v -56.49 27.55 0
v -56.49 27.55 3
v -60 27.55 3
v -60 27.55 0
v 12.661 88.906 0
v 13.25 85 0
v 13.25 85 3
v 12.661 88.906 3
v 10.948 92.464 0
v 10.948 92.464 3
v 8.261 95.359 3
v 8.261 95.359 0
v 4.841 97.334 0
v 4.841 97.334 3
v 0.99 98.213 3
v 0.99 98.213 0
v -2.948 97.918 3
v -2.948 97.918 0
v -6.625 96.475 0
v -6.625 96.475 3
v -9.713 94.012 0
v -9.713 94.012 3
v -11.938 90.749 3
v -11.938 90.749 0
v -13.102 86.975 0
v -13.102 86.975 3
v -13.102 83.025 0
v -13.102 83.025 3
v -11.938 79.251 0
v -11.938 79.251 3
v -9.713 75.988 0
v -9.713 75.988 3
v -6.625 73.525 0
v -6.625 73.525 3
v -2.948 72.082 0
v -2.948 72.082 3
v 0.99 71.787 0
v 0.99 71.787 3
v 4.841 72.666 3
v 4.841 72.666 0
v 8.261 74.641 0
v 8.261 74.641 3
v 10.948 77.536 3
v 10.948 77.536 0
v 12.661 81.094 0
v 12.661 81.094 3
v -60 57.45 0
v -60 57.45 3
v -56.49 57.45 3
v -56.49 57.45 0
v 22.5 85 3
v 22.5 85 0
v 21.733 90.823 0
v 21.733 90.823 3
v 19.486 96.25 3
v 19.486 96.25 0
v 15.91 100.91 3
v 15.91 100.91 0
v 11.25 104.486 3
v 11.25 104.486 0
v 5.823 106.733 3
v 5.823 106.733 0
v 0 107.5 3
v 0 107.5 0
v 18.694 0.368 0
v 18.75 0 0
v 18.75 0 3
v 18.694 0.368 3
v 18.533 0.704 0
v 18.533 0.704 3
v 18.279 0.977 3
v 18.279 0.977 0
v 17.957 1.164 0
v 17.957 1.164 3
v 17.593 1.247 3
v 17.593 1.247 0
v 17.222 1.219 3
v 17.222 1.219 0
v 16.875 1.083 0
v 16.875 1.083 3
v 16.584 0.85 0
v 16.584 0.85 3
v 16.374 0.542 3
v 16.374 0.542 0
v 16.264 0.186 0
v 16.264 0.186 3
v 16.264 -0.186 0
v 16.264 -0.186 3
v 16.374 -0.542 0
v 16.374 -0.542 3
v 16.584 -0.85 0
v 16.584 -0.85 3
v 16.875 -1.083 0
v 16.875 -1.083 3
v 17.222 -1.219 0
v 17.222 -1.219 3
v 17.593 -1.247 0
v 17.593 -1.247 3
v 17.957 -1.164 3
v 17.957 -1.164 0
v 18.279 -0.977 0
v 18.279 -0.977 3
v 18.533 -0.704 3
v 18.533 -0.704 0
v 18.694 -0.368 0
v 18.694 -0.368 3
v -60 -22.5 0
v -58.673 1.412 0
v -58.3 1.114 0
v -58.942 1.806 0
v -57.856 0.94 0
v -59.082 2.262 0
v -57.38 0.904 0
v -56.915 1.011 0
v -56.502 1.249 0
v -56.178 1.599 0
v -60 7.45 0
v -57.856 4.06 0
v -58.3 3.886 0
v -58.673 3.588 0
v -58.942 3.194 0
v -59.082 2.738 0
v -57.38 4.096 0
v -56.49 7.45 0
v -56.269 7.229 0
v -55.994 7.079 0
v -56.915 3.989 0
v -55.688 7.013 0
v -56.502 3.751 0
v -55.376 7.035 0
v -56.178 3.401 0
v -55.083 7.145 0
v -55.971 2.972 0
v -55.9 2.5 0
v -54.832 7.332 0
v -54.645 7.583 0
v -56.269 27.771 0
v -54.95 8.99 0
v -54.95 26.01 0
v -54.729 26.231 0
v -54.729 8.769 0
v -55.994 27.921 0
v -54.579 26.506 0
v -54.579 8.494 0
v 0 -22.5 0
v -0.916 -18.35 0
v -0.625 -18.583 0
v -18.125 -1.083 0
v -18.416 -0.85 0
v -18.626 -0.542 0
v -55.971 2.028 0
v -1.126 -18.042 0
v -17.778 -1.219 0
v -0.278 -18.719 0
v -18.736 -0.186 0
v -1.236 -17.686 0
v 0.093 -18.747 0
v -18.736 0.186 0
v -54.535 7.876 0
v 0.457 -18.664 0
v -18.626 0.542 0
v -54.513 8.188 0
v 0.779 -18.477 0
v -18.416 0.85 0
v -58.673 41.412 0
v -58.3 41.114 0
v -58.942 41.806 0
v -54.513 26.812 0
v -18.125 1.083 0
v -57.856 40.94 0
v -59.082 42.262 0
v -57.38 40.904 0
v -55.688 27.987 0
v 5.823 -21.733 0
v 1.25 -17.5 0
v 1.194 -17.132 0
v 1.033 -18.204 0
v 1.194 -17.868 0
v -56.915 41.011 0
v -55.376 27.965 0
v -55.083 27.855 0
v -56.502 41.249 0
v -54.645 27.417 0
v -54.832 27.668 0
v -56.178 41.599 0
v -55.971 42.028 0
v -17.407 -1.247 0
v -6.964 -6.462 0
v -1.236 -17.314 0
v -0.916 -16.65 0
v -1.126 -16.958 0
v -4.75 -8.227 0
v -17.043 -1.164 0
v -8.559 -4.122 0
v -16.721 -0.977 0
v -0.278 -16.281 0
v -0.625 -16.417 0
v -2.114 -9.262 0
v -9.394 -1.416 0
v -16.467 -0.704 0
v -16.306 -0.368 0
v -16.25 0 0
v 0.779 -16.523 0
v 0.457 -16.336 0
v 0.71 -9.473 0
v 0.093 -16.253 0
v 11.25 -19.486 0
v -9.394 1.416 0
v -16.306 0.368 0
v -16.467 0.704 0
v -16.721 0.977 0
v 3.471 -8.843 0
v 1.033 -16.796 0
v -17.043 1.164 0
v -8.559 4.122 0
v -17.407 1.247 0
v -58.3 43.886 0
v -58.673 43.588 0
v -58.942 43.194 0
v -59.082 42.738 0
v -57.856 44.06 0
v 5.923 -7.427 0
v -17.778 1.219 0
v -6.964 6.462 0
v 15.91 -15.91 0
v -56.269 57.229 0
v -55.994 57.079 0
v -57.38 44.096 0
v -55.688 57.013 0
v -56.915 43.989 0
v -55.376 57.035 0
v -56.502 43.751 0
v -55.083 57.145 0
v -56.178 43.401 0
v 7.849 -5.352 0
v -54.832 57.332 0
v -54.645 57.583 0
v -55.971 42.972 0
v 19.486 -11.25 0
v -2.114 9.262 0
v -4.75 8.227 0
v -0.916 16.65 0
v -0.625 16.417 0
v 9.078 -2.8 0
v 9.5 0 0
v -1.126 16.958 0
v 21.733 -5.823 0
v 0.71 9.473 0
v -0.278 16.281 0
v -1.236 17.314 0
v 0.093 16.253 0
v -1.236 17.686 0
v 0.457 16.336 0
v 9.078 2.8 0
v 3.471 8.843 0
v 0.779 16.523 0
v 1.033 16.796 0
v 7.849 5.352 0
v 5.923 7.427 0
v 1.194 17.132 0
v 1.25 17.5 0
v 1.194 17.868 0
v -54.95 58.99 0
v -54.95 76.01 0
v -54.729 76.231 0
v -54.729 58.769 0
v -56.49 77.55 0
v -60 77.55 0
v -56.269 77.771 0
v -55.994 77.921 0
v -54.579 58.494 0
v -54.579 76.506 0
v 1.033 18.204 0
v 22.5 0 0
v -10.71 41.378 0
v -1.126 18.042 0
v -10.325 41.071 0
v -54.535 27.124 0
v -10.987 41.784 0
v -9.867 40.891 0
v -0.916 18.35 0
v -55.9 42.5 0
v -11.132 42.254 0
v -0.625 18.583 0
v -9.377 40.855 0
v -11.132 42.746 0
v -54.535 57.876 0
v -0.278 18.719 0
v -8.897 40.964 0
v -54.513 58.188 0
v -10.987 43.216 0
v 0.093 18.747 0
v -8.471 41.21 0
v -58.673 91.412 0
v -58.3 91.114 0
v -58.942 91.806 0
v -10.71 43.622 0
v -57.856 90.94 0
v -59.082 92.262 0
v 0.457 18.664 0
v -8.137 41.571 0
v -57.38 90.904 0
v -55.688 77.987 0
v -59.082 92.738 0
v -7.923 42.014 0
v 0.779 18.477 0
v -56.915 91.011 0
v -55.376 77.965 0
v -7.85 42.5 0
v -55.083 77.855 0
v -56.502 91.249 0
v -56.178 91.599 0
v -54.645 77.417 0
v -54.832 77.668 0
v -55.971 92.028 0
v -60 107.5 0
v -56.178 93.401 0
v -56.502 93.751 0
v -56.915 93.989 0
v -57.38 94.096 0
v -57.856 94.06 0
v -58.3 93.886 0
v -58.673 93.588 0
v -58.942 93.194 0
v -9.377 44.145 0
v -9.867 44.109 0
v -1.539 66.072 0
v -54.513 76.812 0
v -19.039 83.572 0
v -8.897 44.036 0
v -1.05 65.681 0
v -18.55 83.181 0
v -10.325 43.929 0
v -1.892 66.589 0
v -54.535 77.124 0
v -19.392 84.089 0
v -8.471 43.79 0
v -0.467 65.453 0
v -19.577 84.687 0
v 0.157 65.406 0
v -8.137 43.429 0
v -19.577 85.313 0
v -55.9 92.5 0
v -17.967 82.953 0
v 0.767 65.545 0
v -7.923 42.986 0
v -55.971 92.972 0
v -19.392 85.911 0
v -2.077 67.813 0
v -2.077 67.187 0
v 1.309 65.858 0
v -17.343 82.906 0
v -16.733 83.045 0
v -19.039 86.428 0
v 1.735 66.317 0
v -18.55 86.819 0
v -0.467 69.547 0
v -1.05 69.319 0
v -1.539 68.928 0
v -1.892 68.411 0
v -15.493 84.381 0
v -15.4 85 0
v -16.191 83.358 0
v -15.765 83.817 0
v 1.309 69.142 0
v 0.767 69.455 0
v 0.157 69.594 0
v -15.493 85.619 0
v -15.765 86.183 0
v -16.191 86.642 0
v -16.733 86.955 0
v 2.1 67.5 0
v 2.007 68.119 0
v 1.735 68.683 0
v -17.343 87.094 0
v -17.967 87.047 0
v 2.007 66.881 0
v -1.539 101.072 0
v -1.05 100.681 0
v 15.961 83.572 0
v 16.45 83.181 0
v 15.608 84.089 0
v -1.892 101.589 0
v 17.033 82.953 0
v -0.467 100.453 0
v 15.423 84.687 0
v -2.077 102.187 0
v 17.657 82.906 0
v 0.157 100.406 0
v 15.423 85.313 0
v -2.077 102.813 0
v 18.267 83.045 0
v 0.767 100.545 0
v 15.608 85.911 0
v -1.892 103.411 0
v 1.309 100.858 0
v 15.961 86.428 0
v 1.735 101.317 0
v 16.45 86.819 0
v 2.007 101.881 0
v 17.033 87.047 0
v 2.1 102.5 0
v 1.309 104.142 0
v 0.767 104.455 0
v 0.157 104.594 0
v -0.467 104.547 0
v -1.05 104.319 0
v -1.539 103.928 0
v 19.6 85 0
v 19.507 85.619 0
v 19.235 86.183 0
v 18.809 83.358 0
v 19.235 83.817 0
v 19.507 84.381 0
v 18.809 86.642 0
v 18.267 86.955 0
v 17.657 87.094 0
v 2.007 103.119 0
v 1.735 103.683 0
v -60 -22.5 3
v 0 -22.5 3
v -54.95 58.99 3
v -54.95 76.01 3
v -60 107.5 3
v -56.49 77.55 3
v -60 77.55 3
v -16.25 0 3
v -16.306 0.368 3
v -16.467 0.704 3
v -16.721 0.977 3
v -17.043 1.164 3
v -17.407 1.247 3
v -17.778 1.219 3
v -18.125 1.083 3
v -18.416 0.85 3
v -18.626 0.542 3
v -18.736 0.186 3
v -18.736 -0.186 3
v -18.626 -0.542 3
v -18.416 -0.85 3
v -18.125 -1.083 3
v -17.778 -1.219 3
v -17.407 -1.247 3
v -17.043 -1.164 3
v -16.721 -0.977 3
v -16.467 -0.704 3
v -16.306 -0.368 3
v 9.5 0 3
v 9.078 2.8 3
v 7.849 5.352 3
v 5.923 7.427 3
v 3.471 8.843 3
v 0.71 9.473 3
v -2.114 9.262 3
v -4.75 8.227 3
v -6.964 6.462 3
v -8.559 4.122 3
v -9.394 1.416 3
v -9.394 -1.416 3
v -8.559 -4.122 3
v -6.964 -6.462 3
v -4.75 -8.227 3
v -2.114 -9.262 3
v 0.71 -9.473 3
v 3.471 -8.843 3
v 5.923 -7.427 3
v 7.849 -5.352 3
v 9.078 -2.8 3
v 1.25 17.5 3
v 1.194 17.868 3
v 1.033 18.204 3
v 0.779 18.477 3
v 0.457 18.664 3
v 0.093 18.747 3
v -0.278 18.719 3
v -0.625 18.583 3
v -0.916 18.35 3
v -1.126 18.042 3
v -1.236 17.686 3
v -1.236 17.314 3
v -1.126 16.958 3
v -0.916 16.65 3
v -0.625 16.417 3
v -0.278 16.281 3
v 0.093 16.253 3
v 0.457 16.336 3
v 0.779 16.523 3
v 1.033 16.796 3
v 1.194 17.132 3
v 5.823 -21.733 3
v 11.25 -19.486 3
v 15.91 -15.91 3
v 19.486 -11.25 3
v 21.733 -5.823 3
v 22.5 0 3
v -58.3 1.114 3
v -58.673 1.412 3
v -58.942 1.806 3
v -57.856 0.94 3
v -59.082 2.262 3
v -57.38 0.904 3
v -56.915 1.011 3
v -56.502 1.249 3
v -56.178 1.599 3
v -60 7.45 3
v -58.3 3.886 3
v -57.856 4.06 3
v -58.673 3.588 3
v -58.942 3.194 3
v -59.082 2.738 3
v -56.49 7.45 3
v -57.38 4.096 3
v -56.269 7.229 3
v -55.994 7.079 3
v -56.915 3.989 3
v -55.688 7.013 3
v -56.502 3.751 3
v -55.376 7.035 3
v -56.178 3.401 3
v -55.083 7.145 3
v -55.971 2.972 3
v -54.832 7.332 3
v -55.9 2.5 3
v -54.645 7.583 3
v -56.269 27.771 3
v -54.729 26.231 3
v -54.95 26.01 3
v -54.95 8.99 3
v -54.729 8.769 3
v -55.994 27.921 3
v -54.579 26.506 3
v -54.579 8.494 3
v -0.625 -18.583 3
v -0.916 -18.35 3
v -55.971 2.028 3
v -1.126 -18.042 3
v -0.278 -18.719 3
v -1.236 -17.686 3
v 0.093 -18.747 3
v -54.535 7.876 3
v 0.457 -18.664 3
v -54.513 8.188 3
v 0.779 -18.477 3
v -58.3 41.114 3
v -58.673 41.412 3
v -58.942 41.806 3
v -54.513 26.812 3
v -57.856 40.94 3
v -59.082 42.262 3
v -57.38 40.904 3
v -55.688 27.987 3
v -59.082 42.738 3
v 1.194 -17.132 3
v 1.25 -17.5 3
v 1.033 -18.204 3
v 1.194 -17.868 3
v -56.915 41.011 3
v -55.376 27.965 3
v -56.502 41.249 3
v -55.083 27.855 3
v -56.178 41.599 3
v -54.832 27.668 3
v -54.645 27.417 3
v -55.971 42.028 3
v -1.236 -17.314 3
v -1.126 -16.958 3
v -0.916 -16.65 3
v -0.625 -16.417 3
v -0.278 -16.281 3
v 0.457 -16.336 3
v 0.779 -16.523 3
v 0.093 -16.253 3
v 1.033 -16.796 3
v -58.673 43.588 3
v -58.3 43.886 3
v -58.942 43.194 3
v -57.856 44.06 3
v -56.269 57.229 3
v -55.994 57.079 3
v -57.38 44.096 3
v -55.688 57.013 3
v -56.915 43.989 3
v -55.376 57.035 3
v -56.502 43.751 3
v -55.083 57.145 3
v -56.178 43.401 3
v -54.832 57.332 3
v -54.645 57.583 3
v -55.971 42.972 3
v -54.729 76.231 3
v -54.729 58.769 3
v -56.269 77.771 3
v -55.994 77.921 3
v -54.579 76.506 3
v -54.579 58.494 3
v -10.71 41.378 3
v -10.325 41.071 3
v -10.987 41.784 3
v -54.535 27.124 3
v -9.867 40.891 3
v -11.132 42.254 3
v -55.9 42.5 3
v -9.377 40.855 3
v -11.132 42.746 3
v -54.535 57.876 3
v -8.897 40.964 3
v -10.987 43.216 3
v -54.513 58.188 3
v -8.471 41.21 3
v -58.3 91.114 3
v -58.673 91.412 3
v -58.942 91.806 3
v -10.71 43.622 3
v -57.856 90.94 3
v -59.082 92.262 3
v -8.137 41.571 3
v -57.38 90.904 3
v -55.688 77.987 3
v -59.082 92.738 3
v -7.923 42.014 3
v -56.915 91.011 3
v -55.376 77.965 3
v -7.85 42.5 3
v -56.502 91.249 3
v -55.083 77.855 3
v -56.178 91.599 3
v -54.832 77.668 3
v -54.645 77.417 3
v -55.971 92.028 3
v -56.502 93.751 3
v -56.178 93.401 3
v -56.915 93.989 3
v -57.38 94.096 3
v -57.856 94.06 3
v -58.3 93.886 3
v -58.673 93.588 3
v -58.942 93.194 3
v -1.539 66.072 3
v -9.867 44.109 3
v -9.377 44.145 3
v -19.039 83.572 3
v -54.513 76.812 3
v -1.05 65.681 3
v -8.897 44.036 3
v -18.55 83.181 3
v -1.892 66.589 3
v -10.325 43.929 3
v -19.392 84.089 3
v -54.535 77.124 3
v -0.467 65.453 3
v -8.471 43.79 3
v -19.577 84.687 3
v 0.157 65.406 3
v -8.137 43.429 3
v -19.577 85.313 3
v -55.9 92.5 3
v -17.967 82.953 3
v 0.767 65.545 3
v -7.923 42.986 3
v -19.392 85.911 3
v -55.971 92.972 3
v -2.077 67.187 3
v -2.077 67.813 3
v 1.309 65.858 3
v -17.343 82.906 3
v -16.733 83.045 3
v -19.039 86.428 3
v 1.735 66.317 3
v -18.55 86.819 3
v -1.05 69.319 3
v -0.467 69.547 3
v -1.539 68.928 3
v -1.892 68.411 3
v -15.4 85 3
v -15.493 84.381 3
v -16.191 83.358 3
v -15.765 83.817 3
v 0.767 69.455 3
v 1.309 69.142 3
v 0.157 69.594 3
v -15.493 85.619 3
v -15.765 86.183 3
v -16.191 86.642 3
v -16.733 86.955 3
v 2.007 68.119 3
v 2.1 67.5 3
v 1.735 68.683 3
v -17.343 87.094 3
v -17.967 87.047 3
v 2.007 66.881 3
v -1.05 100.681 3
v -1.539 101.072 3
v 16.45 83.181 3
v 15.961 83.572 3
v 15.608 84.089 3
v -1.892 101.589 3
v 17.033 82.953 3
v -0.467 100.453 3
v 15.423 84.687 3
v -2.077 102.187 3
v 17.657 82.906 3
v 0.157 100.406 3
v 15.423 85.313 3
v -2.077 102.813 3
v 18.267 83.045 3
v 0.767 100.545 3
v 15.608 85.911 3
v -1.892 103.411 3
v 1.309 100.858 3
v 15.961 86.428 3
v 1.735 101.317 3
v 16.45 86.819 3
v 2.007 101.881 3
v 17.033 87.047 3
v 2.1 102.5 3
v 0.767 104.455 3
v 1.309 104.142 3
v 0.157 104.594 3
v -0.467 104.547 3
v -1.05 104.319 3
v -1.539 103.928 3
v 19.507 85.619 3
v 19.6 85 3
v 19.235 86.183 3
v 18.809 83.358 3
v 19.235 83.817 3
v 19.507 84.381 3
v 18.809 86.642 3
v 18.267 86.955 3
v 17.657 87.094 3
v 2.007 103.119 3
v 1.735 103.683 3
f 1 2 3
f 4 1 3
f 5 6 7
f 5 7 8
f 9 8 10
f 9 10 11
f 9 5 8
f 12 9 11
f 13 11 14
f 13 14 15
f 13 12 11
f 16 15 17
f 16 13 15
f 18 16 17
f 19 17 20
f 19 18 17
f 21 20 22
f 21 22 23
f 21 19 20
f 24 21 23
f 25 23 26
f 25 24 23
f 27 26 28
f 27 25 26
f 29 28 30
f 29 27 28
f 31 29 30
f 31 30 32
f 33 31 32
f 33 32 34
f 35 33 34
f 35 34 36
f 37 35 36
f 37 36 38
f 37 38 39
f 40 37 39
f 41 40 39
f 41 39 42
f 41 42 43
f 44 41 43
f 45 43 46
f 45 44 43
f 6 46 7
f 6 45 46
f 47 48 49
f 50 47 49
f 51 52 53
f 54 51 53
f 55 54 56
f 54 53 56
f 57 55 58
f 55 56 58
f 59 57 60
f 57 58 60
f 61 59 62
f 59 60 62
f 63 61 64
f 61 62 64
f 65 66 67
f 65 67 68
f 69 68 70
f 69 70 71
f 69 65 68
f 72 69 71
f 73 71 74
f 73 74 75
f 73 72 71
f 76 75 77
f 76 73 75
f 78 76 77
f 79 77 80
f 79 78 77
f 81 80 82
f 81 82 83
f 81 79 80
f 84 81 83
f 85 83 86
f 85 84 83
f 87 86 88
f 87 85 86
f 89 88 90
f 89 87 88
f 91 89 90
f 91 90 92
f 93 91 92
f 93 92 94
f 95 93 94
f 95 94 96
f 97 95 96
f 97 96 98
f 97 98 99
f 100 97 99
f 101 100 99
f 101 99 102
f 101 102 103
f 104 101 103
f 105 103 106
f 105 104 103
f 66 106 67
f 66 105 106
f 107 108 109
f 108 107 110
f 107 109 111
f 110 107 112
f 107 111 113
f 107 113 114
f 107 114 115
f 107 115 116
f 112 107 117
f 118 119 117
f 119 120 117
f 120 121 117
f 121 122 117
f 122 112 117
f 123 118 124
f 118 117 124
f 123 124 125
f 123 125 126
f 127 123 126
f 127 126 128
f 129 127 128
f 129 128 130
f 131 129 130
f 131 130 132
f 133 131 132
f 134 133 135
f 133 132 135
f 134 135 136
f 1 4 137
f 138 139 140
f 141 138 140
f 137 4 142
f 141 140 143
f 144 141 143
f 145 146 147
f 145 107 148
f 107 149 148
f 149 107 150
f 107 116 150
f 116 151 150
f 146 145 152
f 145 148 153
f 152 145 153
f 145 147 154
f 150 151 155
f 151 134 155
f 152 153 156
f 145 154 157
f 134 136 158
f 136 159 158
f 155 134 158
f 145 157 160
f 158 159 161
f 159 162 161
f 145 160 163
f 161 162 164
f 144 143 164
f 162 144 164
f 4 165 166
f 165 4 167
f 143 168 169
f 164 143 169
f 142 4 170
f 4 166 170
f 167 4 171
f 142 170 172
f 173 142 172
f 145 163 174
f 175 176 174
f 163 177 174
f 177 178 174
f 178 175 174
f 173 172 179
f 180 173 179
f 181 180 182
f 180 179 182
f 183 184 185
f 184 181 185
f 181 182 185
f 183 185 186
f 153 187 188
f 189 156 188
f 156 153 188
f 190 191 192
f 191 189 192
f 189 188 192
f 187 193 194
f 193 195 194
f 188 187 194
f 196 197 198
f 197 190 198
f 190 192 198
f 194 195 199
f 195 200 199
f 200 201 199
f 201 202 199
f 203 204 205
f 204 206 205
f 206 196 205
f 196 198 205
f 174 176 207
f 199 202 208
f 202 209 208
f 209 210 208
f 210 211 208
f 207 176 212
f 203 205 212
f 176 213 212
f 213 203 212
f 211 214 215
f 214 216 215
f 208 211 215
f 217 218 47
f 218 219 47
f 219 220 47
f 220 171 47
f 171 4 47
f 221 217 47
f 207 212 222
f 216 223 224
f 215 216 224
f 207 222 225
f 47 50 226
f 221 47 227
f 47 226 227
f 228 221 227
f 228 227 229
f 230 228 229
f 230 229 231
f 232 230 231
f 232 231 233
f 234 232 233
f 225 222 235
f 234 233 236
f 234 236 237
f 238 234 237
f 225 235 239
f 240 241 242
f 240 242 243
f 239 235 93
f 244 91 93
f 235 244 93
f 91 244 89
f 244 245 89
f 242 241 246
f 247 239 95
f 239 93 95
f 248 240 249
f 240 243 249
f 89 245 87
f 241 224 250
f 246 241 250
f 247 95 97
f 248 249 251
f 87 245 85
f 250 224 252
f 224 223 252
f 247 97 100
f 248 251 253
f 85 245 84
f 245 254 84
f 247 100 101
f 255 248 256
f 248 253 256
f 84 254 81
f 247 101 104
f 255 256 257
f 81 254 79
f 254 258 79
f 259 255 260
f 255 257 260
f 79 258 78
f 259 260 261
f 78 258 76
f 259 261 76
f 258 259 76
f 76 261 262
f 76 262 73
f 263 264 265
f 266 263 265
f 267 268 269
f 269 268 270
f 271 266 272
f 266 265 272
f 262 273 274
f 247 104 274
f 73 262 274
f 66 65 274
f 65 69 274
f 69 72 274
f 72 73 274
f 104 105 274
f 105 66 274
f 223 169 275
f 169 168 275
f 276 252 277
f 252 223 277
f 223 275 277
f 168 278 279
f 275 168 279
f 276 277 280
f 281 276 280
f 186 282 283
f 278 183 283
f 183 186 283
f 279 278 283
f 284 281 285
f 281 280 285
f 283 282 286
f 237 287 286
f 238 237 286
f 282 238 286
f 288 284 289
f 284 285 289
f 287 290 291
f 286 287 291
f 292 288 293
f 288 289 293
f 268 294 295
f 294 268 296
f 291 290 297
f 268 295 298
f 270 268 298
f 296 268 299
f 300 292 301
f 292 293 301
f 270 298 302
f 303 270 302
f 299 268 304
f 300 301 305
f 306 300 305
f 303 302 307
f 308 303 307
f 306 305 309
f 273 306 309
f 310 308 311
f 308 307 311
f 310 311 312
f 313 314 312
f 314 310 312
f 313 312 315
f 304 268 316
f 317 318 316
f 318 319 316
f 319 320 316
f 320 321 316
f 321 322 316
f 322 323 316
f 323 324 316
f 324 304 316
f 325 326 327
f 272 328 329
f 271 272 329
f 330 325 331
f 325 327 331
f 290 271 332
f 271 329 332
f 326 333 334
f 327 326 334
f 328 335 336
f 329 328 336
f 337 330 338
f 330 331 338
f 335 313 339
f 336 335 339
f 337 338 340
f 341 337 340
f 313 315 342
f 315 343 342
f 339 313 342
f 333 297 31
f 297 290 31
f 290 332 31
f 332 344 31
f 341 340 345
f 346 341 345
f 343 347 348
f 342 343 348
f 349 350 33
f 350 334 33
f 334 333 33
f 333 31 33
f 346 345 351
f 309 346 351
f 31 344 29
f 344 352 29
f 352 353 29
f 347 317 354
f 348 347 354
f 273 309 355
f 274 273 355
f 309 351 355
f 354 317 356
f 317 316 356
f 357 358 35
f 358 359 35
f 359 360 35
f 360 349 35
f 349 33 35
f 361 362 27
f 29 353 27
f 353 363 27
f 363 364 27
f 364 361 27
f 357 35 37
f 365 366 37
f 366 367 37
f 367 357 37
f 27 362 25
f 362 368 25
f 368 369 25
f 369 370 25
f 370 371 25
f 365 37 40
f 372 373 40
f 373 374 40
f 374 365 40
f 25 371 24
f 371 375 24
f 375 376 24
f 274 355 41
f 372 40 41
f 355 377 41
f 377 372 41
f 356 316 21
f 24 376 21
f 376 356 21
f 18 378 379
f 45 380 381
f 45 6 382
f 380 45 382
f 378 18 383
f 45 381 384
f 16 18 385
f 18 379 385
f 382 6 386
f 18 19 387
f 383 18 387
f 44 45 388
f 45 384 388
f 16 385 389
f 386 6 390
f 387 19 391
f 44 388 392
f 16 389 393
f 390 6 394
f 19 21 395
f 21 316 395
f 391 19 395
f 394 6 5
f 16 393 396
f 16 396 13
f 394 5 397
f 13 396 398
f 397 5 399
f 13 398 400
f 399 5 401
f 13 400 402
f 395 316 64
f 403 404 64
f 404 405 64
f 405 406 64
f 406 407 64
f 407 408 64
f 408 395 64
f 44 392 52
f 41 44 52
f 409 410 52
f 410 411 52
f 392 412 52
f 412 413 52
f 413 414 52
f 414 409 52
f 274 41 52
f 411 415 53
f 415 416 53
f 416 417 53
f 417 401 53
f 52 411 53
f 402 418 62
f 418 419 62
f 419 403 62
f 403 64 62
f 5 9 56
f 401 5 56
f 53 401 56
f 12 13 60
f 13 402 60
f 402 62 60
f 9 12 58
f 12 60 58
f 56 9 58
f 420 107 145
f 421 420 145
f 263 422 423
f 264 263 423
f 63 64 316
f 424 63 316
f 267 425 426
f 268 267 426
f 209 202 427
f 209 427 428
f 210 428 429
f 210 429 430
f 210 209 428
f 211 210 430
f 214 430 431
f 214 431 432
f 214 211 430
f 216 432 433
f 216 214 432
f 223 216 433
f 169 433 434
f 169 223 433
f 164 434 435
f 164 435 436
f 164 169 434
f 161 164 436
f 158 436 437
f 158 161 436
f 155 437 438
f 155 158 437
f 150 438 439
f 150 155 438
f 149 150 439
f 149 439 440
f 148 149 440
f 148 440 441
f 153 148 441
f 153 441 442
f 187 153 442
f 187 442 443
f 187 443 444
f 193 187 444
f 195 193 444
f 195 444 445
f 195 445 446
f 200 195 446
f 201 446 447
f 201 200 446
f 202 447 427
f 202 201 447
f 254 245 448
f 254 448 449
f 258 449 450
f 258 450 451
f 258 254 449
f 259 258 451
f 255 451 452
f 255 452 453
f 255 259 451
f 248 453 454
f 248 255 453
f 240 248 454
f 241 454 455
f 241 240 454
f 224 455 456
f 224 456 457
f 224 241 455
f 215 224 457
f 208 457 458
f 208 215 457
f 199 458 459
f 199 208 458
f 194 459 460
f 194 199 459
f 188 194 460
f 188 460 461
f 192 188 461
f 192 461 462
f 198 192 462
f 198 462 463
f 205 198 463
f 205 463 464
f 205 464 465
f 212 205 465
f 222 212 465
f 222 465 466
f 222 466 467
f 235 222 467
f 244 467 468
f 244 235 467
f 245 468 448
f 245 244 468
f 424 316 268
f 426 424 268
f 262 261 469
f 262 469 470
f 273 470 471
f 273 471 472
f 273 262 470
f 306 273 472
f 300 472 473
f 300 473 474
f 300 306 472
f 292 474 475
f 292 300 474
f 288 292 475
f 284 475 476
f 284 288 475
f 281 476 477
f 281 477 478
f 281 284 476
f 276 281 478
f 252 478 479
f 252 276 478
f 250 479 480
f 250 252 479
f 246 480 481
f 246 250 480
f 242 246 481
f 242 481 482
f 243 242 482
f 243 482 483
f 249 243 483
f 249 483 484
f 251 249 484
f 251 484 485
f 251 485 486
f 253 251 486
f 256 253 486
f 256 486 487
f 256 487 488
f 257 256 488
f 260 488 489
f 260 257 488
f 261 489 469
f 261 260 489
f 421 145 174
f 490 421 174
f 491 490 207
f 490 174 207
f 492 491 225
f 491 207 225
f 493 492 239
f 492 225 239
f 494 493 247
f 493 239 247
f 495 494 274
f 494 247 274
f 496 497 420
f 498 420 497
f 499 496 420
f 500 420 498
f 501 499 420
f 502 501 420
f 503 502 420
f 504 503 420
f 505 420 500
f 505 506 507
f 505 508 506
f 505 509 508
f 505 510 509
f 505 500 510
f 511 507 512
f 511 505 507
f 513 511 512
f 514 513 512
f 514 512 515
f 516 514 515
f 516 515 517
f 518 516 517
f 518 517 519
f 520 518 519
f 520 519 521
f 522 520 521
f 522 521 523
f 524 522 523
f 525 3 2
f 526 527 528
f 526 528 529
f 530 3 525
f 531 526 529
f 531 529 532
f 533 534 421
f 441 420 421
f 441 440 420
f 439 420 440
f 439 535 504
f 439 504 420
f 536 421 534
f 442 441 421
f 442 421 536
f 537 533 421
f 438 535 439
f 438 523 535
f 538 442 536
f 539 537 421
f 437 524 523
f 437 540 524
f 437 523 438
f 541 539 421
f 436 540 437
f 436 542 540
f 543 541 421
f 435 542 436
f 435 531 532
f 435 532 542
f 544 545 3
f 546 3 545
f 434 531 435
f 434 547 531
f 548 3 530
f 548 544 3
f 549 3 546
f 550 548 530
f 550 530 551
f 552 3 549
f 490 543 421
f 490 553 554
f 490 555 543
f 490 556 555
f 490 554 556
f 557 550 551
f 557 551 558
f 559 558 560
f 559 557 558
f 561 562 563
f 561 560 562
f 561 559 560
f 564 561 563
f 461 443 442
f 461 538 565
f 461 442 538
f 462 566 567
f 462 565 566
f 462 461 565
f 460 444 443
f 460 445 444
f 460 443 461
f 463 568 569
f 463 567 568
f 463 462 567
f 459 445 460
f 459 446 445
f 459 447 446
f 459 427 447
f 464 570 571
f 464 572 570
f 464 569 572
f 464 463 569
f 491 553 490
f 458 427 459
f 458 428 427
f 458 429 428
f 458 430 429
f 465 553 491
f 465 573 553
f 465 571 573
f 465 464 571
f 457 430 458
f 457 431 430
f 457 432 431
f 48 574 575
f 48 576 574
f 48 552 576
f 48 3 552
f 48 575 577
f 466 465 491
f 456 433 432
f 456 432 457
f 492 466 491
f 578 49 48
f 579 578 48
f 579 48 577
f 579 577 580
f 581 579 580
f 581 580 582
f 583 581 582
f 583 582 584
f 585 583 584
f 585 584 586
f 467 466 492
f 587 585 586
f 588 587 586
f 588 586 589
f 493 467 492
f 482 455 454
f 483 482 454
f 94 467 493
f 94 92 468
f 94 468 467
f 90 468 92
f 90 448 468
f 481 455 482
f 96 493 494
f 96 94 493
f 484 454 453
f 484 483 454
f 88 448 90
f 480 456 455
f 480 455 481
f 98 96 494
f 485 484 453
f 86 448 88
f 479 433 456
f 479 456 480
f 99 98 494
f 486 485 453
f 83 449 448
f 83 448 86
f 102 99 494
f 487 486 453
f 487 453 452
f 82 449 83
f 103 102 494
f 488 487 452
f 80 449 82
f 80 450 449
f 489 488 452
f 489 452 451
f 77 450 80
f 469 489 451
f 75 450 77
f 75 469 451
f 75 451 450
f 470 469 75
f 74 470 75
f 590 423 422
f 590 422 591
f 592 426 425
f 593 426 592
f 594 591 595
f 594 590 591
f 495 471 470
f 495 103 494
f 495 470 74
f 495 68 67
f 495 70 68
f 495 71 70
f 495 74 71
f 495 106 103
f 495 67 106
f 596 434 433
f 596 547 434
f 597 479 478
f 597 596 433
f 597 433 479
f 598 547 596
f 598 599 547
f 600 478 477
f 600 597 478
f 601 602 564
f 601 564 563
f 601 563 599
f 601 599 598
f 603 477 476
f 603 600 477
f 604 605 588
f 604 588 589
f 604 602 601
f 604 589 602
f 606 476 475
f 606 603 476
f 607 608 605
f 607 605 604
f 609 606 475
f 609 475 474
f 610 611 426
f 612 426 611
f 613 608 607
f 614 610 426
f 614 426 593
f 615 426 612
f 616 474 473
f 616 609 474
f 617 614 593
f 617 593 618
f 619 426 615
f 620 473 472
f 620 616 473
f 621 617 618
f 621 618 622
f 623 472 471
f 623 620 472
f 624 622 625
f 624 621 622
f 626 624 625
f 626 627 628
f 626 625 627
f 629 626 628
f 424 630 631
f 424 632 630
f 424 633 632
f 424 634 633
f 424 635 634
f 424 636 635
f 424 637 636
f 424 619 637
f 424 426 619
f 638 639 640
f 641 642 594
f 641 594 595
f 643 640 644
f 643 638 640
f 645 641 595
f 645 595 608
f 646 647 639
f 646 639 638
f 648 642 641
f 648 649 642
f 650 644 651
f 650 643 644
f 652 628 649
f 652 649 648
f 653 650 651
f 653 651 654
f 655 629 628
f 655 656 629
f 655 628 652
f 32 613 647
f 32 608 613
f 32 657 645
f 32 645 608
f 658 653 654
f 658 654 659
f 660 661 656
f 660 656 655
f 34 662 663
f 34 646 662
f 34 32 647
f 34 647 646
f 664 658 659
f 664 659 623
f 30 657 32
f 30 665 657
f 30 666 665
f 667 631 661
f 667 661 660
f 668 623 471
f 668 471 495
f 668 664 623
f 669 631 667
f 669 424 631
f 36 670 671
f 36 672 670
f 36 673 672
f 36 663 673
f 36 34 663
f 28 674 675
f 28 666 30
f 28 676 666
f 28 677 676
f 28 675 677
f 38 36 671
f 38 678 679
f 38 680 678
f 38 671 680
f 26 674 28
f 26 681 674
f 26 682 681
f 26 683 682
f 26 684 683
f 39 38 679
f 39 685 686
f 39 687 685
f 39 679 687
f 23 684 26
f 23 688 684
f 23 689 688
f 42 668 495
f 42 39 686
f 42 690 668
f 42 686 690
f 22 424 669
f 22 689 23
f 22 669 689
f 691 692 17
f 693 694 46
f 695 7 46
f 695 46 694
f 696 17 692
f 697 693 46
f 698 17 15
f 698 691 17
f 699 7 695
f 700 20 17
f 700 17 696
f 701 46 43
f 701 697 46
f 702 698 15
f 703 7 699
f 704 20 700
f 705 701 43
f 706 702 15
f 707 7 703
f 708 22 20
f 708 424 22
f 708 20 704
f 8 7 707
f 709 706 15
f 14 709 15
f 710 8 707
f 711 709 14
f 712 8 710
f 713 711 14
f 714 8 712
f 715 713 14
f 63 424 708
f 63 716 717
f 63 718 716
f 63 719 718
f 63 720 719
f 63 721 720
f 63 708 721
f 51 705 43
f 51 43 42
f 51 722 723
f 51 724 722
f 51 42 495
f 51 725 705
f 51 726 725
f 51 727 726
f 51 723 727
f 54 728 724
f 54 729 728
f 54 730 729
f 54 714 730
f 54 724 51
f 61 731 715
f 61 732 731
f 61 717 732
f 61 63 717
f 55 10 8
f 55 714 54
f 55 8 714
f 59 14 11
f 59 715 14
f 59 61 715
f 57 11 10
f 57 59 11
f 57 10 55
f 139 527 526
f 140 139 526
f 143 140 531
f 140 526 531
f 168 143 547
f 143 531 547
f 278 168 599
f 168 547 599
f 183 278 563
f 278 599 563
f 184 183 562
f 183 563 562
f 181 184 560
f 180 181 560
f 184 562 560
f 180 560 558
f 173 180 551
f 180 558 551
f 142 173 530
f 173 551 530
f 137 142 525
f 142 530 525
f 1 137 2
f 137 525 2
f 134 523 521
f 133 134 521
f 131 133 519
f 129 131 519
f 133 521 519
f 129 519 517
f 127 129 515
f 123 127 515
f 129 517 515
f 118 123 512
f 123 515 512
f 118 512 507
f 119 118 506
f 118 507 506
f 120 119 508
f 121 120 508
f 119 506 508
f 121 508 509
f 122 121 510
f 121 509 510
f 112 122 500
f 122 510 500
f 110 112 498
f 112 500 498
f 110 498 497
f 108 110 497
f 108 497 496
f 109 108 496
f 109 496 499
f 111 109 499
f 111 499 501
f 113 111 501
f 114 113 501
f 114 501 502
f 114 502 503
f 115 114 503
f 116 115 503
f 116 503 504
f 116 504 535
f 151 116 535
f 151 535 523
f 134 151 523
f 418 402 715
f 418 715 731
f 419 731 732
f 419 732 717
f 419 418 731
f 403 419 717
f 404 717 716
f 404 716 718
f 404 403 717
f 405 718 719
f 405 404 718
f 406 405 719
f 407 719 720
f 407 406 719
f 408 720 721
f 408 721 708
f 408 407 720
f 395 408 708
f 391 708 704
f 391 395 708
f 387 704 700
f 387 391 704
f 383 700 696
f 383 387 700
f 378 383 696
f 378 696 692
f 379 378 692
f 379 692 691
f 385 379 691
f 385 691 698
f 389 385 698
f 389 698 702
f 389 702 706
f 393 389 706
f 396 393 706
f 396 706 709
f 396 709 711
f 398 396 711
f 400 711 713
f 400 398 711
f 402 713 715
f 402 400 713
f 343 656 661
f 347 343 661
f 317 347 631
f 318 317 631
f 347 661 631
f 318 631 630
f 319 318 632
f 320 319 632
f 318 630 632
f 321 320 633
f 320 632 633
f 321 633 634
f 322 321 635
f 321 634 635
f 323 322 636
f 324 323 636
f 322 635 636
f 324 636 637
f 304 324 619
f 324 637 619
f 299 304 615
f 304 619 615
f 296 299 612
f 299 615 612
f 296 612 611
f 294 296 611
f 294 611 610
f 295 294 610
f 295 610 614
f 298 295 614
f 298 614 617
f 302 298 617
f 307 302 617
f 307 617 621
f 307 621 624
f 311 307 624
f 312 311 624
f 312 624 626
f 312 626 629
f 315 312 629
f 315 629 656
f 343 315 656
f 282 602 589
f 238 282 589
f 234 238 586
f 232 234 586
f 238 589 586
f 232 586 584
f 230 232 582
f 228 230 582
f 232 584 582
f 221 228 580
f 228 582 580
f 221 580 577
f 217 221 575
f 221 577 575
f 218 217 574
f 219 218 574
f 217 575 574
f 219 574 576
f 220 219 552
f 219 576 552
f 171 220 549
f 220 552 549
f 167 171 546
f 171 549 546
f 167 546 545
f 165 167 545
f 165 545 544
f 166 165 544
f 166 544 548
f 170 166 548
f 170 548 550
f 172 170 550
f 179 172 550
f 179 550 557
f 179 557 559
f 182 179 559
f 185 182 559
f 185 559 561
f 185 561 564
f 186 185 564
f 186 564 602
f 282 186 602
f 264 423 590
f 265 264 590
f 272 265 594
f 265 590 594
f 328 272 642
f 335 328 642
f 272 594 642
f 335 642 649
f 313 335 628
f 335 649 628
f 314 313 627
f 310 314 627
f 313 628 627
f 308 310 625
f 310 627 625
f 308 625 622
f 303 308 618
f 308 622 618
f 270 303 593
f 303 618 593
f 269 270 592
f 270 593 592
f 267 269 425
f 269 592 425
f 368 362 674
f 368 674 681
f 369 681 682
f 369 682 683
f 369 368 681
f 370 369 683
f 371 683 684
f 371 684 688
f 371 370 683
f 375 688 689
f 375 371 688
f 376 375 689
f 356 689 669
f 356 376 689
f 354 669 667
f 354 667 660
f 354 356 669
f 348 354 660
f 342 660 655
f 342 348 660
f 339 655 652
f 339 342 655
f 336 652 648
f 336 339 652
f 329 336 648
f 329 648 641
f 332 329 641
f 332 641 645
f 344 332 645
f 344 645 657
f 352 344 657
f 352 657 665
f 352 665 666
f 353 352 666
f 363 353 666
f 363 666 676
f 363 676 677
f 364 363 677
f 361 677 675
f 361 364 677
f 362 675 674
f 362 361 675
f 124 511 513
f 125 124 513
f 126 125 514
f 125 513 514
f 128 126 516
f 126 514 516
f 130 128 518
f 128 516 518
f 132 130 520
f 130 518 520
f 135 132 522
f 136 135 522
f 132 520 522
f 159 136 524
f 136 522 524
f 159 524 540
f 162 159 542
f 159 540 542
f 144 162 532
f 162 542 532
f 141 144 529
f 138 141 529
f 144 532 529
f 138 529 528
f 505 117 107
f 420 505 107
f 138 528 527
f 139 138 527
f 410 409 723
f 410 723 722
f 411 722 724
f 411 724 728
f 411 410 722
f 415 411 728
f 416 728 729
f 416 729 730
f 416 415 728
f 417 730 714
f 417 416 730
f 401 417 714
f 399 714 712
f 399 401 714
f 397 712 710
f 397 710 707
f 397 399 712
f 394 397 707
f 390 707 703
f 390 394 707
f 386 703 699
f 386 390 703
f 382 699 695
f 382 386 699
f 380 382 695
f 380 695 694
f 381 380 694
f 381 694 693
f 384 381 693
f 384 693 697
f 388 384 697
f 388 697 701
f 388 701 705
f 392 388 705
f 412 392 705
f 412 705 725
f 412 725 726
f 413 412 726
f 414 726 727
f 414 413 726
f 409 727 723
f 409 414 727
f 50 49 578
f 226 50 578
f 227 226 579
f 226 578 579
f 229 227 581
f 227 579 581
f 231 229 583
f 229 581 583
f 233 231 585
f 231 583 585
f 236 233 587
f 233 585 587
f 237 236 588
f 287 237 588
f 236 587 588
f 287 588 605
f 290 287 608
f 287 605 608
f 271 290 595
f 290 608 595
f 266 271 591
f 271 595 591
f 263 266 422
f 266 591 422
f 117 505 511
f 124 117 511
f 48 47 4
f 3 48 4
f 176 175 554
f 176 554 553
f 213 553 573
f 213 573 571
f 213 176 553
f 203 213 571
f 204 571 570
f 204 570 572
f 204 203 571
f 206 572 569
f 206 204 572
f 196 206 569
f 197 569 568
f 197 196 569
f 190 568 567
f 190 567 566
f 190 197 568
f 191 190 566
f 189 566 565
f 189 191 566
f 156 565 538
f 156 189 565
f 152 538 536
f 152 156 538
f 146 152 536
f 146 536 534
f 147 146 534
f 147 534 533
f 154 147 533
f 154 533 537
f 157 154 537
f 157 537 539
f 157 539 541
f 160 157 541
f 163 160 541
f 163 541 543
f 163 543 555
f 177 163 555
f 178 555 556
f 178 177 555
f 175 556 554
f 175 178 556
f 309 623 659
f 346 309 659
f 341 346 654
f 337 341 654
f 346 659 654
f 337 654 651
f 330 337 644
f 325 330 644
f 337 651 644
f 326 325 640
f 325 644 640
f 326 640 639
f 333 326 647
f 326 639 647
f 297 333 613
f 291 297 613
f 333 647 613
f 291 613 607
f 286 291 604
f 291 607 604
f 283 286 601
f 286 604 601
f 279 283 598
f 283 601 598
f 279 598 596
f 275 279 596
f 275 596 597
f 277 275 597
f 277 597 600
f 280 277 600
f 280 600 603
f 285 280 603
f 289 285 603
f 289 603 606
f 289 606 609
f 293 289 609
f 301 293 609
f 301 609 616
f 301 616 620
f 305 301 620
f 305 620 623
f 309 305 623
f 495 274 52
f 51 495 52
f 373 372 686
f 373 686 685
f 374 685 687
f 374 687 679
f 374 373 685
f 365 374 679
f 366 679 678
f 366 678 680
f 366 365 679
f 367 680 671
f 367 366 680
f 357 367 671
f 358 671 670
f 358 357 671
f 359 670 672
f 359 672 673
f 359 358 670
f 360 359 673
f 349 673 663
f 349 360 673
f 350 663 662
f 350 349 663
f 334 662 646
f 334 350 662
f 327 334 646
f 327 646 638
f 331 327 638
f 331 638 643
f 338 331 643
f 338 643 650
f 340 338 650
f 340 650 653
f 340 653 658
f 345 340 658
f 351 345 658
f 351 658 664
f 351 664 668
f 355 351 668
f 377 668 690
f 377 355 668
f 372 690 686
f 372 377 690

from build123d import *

# Parameters (mm, degrees)
SKETCH_2_R          = 9.5
SKETCH_2_R_2        = 1.25
SKETCH_2_R_3        = 13.25
SKETCH_2_R_4        = 2.1
EXTRUDE_1_DEPTH     = 3
SKETCH_4_R          = 1.6
CUT_EXTRUDE_1_DEPTH = 10
SKETCH_5_R          = 1.65
CUT_EXTRUDE_2_DEPTH = 10


with BuildPart() as part:
    # ｽｹｯﾁ2 → ﾎﾞｽ - 押し出し1 (new body)
    with BuildSketch(Plane.XY):
        with BuildLine():
            Line((-60, -22.5), (-40, -22.5))
            Line((-40, -22.5), (0, -22.5))
            ThreePointArc((0, -22.5), (15.909902577, -15.909902577), (22.5, 0))
            Line((22.5, 0), (22.5, 85))
            ThreePointArc((22.5, 85), (15.909902577, 100.909902577), (0, 107.5))
            Line((0, 107.5), (-40, 107.5))
            Line((-40, 107.5), (-60, 107.5))
            Line((-60, 107.5), (-60, -22.5))
        make_face()
        Circle(SKETCH_2_R, mode=Mode.SUBTRACT)
        with Locations((0, 17.5)):
            Circle(SKETCH_2_R_2, mode=Mode.SUBTRACT)
        with Locations((17.5, 0)):
            Circle(SKETCH_2_R_2, mode=Mode.SUBTRACT)
        with Locations((0, -17.5)):
            Circle(SKETCH_2_R_2, mode=Mode.SUBTRACT)
        with Locations((-17.5, 0)):
            Circle(SKETCH_2_R_2, mode=Mode.SUBTRACT)
        with Locations((0, 85)):
            Circle(SKETCH_2_R_3, mode=Mode.SUBTRACT)
        with Locations((0, 67.5)):
            Circle(SKETCH_2_R_4, mode=Mode.SUBTRACT)
        with Locations((-17.5, 85)):
            Circle(SKETCH_2_R_4, mode=Mode.SUBTRACT)
        with Locations((0, 102.5)):
            Circle(SKETCH_2_R_4, mode=Mode.SUBTRACT)
        with Locations((17.5, 85)):
            Circle(SKETCH_2_R_4, mode=Mode.SUBTRACT)
    extrude(amount=EXTRUDE_1_DEPTH)

    # ｽｹｯﾁ4 → ｶｯﾄ - 押し出し1 (cut)
    with BuildSketch(Plane.XY.offset(3)):
        with BuildLine():
            Line((-56.49, 77.55), (-60, 77.55))
            Line((-60, 77.55), (-60, 57.45))
            Line((-60, 57.45), (-56.49, 57.45))
            ThreePointArc((-56.49, 57.45), (-54.832182541, 57.332182541), (-54.95, 58.99))
            Line((-54.95, 58.99), (-54.95, 76.01))
            ThreePointArc((-54.95, 76.01), (-54.832182541, 77.667817459), (-56.49, 77.55))
        make_face()
        with BuildLine():
            Line((-56.49, 27.55), (-60, 27.55))
            Line((-60, 27.55), (-60, 7.45))
            Line((-60, 7.45), (-56.49, 7.45))
            ThreePointArc((-56.49, 7.45), (-54.832182541, 7.332182541), (-54.95, 8.99))
            Line((-54.95, 8.99), (-54.95, 26.01))
            ThreePointArc((-54.95, 26.01), (-54.832182541, 27.667817459), (-56.49, 27.55))
        make_face()
        with Locations((-57.5, 2.5)):
            Circle(SKETCH_4_R)
        with Locations((-57.5, 42.5)):
            Circle(SKETCH_4_R)
        with Locations((-57.5, 92.5)):
            Circle(SKETCH_4_R)
    extrude(amount=-CUT_EXTRUDE_1_DEPTH, mode=Mode.SUBTRACT)

    # ｽｹｯﾁ5 → ｶｯﾄ - 押し出し2 (cut)
    with BuildSketch(Plane.XY.offset(3)):
        with Locations((-9.5, 42.5)):
            Circle(SKETCH_5_R)
    extrude(amount=-CUT_EXTRUDE_2_DEPTH, mode=Mode.SUBTRACT)


solid = part.part
